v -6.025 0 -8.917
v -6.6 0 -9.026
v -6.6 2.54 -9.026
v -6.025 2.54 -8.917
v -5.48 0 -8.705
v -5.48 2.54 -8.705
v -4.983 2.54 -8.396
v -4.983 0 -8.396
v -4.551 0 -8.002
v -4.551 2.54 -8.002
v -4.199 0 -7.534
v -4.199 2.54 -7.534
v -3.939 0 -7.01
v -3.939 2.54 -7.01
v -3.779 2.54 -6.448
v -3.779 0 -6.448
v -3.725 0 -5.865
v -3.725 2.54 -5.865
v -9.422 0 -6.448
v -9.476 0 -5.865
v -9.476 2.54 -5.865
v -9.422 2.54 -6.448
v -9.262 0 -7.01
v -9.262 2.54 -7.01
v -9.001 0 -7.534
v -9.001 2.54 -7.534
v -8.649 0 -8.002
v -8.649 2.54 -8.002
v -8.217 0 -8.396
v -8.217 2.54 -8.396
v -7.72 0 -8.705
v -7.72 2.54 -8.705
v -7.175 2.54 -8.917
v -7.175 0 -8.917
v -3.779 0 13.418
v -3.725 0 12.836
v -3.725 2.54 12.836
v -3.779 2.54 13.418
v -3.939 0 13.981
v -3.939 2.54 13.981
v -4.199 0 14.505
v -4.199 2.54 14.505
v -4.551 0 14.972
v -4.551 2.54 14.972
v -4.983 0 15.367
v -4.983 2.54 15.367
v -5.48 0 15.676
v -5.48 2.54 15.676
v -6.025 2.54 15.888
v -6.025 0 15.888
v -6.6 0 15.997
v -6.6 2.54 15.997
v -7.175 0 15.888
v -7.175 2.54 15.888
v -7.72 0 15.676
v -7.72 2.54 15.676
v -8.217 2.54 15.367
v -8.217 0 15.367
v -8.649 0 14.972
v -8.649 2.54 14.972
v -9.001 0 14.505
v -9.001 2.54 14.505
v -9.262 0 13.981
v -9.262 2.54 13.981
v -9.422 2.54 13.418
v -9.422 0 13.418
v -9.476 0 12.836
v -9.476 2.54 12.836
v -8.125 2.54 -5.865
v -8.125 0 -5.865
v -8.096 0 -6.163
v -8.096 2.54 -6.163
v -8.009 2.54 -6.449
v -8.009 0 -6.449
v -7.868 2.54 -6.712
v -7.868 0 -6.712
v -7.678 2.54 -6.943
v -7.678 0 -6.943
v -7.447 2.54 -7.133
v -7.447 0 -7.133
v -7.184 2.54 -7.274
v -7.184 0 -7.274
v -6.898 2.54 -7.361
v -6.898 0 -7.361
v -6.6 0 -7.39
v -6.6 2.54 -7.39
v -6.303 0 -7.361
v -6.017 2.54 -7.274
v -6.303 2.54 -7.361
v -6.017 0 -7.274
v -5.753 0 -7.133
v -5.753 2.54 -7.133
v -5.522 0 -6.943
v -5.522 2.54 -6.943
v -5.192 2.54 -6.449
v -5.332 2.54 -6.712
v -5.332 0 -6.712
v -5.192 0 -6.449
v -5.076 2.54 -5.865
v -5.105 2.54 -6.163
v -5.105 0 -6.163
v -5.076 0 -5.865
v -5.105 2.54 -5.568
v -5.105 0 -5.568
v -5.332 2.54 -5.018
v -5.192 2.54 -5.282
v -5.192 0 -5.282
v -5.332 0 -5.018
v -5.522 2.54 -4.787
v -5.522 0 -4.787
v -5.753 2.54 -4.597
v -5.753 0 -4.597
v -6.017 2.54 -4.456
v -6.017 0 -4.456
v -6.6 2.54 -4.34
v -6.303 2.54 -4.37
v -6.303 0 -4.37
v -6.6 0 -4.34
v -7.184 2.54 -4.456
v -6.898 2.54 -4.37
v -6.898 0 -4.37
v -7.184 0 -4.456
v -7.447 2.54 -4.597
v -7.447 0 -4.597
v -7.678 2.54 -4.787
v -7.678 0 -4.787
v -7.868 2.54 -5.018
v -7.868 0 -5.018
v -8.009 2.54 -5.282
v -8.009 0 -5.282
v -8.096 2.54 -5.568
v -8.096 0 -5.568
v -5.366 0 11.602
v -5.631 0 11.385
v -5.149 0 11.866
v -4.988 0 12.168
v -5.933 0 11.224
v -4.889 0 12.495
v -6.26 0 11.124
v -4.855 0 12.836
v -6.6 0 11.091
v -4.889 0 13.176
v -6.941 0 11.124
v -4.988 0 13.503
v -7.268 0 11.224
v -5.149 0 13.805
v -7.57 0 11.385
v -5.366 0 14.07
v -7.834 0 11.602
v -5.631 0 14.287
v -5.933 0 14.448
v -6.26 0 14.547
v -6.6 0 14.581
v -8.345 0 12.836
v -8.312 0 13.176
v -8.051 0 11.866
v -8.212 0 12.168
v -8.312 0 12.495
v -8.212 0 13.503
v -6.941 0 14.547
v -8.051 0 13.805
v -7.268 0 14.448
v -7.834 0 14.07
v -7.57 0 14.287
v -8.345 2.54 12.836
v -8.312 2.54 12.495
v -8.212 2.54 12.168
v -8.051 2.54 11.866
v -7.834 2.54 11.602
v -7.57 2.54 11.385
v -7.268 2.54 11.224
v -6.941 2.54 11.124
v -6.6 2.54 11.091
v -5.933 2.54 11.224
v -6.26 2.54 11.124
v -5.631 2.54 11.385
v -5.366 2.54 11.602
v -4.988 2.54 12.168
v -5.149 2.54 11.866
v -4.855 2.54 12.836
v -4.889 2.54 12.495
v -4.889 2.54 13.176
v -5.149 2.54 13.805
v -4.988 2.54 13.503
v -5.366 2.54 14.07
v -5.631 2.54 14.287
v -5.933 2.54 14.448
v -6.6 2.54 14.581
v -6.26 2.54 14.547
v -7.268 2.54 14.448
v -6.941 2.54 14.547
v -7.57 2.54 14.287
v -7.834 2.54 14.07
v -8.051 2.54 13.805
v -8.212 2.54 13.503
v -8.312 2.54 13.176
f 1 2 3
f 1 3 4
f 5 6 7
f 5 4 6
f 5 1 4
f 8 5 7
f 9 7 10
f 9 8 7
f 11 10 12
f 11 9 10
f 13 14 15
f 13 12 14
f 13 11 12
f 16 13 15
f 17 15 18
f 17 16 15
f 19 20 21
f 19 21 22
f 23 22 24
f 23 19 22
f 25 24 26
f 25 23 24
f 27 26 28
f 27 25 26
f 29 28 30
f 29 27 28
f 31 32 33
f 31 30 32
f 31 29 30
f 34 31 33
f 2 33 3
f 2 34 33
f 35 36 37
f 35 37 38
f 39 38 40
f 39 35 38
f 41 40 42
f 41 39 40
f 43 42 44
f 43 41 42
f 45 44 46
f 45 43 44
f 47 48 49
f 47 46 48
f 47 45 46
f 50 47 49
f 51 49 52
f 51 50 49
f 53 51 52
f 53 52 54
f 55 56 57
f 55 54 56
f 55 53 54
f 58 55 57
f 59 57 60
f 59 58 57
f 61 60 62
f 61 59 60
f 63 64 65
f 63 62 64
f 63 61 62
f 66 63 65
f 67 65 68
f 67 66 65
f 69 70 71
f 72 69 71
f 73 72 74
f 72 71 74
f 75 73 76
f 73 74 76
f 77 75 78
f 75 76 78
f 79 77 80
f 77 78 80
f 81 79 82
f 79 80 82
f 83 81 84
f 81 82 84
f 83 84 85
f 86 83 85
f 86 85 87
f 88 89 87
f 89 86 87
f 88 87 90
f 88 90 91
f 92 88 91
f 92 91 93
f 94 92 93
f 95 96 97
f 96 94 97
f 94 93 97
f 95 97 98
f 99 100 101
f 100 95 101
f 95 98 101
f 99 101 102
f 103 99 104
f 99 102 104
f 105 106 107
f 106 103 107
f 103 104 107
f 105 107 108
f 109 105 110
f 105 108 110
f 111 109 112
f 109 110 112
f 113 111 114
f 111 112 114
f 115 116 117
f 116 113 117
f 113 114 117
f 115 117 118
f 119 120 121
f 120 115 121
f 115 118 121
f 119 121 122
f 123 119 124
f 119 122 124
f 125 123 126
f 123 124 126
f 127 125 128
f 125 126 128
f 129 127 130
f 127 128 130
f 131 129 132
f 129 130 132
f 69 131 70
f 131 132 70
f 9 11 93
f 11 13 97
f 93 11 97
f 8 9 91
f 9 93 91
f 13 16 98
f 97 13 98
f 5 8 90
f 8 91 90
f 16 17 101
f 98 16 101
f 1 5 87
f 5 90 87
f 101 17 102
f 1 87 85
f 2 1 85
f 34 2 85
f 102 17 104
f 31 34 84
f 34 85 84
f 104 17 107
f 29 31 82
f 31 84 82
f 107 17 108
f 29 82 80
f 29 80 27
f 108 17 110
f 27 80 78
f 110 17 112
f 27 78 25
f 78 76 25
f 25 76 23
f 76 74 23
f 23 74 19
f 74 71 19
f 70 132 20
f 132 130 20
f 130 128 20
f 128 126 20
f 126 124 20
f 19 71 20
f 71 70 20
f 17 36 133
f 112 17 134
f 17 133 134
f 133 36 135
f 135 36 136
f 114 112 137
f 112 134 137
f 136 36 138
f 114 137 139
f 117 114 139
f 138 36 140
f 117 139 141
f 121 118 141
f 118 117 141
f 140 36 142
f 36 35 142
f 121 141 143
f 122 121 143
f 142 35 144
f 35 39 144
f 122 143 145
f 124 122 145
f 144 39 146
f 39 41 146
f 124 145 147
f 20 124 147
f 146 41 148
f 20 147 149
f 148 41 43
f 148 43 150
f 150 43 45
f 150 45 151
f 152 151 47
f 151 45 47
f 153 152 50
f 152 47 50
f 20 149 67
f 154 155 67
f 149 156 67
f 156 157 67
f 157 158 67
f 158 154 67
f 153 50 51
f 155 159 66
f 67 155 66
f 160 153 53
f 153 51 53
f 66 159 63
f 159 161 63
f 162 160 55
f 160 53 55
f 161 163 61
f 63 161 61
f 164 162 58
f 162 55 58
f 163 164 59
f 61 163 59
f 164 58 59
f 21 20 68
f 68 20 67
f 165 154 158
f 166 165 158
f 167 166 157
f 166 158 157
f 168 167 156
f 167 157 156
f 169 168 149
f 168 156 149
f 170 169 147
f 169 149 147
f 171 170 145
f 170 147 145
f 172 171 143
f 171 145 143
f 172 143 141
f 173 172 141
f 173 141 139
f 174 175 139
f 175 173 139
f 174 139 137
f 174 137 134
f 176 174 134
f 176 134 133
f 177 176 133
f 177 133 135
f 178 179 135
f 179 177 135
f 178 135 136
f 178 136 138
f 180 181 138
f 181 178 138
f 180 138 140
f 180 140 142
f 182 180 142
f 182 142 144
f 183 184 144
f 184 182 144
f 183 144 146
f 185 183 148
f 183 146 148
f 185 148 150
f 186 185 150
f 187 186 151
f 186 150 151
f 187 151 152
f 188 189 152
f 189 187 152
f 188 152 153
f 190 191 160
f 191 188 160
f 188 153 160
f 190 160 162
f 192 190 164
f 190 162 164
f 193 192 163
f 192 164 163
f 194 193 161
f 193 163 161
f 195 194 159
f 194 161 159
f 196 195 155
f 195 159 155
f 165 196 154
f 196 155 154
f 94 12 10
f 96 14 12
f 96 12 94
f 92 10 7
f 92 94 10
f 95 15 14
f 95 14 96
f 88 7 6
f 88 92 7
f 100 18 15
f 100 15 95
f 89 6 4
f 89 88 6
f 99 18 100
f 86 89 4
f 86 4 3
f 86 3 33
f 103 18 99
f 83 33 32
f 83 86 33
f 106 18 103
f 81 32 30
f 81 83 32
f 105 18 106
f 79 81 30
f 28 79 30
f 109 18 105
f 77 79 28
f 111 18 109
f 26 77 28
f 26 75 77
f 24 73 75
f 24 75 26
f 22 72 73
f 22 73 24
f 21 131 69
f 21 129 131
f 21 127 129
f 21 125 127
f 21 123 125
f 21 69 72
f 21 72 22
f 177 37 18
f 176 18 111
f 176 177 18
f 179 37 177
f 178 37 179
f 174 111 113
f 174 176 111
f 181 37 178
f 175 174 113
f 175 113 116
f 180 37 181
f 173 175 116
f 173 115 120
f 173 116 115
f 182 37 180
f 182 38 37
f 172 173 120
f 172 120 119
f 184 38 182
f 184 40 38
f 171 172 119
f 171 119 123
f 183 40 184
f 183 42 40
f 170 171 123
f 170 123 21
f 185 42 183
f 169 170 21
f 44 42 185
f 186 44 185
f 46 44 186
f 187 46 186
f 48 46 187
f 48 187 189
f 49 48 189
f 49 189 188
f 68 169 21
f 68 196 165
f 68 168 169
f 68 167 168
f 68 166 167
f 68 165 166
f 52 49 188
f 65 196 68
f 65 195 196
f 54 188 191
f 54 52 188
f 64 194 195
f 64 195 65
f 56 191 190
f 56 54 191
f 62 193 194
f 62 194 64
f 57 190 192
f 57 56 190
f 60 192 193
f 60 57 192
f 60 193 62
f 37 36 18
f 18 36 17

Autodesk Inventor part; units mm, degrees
ref_plane "YZ Plane" through (0, 0, 0) normal (1, 0, 0) x (0, 1, 0)
ref_plane "XZ Plane" through (0, 0, 0) normal (0, 1, 0) x (-1, 0, 0)
ref_plane "XY Plane" through (0, 0, 0) normal (0, 0, 1) x (1, 0, 0)
sketch "Sketch1" plane through (0, 0, 0) normal (0, 1, 0) x (-1, 0, 0)
  line L0 (6.3007, 16.0107) -> (6.8999, 16.0107)
  line L1 (3.7249, 12.8357) -> (3.7249, -5.8651)
  line L2 (6.8999, -9.0401) -> (6.3007, -9.0401)
  line L3 (9.4757, -5.8651) -> (9.4757, 12.8357)
  arc A0 (9.4757, 12.8357) -> (6.3007, 16.0107) centre (6.3007, 12.8357) ccw
  arc A1 (6.3007, -9.0401) -> (9.4757, -5.8651) centre (6.3007, -5.8651) ccw
  arc A2 (3.7249, -5.8651) -> (6.8999, -9.0401) centre (6.8999, -5.8651) ccw
  arc A3 (6.8999, 16.0107) -> (3.7249, 12.8357) centre (6.8999, 12.8357) ccw
  circle A4 centre (6.6003, 12.8357) radius 1.745
  circle A5 centre (6.6003, -5.8651) radius 1.5248
  point P0 (0, 0)
  point P1 (6.6003, 15.9965)
  point P2 (6.6003, -9.0259)
  dimension "d0" = 3.175
extrude "Extrusion1" add sketch "Sketch1" along normal blind 2.54 contours A0 L3 A1 A2 L1 A3
properties part number "GRIPPER1"
